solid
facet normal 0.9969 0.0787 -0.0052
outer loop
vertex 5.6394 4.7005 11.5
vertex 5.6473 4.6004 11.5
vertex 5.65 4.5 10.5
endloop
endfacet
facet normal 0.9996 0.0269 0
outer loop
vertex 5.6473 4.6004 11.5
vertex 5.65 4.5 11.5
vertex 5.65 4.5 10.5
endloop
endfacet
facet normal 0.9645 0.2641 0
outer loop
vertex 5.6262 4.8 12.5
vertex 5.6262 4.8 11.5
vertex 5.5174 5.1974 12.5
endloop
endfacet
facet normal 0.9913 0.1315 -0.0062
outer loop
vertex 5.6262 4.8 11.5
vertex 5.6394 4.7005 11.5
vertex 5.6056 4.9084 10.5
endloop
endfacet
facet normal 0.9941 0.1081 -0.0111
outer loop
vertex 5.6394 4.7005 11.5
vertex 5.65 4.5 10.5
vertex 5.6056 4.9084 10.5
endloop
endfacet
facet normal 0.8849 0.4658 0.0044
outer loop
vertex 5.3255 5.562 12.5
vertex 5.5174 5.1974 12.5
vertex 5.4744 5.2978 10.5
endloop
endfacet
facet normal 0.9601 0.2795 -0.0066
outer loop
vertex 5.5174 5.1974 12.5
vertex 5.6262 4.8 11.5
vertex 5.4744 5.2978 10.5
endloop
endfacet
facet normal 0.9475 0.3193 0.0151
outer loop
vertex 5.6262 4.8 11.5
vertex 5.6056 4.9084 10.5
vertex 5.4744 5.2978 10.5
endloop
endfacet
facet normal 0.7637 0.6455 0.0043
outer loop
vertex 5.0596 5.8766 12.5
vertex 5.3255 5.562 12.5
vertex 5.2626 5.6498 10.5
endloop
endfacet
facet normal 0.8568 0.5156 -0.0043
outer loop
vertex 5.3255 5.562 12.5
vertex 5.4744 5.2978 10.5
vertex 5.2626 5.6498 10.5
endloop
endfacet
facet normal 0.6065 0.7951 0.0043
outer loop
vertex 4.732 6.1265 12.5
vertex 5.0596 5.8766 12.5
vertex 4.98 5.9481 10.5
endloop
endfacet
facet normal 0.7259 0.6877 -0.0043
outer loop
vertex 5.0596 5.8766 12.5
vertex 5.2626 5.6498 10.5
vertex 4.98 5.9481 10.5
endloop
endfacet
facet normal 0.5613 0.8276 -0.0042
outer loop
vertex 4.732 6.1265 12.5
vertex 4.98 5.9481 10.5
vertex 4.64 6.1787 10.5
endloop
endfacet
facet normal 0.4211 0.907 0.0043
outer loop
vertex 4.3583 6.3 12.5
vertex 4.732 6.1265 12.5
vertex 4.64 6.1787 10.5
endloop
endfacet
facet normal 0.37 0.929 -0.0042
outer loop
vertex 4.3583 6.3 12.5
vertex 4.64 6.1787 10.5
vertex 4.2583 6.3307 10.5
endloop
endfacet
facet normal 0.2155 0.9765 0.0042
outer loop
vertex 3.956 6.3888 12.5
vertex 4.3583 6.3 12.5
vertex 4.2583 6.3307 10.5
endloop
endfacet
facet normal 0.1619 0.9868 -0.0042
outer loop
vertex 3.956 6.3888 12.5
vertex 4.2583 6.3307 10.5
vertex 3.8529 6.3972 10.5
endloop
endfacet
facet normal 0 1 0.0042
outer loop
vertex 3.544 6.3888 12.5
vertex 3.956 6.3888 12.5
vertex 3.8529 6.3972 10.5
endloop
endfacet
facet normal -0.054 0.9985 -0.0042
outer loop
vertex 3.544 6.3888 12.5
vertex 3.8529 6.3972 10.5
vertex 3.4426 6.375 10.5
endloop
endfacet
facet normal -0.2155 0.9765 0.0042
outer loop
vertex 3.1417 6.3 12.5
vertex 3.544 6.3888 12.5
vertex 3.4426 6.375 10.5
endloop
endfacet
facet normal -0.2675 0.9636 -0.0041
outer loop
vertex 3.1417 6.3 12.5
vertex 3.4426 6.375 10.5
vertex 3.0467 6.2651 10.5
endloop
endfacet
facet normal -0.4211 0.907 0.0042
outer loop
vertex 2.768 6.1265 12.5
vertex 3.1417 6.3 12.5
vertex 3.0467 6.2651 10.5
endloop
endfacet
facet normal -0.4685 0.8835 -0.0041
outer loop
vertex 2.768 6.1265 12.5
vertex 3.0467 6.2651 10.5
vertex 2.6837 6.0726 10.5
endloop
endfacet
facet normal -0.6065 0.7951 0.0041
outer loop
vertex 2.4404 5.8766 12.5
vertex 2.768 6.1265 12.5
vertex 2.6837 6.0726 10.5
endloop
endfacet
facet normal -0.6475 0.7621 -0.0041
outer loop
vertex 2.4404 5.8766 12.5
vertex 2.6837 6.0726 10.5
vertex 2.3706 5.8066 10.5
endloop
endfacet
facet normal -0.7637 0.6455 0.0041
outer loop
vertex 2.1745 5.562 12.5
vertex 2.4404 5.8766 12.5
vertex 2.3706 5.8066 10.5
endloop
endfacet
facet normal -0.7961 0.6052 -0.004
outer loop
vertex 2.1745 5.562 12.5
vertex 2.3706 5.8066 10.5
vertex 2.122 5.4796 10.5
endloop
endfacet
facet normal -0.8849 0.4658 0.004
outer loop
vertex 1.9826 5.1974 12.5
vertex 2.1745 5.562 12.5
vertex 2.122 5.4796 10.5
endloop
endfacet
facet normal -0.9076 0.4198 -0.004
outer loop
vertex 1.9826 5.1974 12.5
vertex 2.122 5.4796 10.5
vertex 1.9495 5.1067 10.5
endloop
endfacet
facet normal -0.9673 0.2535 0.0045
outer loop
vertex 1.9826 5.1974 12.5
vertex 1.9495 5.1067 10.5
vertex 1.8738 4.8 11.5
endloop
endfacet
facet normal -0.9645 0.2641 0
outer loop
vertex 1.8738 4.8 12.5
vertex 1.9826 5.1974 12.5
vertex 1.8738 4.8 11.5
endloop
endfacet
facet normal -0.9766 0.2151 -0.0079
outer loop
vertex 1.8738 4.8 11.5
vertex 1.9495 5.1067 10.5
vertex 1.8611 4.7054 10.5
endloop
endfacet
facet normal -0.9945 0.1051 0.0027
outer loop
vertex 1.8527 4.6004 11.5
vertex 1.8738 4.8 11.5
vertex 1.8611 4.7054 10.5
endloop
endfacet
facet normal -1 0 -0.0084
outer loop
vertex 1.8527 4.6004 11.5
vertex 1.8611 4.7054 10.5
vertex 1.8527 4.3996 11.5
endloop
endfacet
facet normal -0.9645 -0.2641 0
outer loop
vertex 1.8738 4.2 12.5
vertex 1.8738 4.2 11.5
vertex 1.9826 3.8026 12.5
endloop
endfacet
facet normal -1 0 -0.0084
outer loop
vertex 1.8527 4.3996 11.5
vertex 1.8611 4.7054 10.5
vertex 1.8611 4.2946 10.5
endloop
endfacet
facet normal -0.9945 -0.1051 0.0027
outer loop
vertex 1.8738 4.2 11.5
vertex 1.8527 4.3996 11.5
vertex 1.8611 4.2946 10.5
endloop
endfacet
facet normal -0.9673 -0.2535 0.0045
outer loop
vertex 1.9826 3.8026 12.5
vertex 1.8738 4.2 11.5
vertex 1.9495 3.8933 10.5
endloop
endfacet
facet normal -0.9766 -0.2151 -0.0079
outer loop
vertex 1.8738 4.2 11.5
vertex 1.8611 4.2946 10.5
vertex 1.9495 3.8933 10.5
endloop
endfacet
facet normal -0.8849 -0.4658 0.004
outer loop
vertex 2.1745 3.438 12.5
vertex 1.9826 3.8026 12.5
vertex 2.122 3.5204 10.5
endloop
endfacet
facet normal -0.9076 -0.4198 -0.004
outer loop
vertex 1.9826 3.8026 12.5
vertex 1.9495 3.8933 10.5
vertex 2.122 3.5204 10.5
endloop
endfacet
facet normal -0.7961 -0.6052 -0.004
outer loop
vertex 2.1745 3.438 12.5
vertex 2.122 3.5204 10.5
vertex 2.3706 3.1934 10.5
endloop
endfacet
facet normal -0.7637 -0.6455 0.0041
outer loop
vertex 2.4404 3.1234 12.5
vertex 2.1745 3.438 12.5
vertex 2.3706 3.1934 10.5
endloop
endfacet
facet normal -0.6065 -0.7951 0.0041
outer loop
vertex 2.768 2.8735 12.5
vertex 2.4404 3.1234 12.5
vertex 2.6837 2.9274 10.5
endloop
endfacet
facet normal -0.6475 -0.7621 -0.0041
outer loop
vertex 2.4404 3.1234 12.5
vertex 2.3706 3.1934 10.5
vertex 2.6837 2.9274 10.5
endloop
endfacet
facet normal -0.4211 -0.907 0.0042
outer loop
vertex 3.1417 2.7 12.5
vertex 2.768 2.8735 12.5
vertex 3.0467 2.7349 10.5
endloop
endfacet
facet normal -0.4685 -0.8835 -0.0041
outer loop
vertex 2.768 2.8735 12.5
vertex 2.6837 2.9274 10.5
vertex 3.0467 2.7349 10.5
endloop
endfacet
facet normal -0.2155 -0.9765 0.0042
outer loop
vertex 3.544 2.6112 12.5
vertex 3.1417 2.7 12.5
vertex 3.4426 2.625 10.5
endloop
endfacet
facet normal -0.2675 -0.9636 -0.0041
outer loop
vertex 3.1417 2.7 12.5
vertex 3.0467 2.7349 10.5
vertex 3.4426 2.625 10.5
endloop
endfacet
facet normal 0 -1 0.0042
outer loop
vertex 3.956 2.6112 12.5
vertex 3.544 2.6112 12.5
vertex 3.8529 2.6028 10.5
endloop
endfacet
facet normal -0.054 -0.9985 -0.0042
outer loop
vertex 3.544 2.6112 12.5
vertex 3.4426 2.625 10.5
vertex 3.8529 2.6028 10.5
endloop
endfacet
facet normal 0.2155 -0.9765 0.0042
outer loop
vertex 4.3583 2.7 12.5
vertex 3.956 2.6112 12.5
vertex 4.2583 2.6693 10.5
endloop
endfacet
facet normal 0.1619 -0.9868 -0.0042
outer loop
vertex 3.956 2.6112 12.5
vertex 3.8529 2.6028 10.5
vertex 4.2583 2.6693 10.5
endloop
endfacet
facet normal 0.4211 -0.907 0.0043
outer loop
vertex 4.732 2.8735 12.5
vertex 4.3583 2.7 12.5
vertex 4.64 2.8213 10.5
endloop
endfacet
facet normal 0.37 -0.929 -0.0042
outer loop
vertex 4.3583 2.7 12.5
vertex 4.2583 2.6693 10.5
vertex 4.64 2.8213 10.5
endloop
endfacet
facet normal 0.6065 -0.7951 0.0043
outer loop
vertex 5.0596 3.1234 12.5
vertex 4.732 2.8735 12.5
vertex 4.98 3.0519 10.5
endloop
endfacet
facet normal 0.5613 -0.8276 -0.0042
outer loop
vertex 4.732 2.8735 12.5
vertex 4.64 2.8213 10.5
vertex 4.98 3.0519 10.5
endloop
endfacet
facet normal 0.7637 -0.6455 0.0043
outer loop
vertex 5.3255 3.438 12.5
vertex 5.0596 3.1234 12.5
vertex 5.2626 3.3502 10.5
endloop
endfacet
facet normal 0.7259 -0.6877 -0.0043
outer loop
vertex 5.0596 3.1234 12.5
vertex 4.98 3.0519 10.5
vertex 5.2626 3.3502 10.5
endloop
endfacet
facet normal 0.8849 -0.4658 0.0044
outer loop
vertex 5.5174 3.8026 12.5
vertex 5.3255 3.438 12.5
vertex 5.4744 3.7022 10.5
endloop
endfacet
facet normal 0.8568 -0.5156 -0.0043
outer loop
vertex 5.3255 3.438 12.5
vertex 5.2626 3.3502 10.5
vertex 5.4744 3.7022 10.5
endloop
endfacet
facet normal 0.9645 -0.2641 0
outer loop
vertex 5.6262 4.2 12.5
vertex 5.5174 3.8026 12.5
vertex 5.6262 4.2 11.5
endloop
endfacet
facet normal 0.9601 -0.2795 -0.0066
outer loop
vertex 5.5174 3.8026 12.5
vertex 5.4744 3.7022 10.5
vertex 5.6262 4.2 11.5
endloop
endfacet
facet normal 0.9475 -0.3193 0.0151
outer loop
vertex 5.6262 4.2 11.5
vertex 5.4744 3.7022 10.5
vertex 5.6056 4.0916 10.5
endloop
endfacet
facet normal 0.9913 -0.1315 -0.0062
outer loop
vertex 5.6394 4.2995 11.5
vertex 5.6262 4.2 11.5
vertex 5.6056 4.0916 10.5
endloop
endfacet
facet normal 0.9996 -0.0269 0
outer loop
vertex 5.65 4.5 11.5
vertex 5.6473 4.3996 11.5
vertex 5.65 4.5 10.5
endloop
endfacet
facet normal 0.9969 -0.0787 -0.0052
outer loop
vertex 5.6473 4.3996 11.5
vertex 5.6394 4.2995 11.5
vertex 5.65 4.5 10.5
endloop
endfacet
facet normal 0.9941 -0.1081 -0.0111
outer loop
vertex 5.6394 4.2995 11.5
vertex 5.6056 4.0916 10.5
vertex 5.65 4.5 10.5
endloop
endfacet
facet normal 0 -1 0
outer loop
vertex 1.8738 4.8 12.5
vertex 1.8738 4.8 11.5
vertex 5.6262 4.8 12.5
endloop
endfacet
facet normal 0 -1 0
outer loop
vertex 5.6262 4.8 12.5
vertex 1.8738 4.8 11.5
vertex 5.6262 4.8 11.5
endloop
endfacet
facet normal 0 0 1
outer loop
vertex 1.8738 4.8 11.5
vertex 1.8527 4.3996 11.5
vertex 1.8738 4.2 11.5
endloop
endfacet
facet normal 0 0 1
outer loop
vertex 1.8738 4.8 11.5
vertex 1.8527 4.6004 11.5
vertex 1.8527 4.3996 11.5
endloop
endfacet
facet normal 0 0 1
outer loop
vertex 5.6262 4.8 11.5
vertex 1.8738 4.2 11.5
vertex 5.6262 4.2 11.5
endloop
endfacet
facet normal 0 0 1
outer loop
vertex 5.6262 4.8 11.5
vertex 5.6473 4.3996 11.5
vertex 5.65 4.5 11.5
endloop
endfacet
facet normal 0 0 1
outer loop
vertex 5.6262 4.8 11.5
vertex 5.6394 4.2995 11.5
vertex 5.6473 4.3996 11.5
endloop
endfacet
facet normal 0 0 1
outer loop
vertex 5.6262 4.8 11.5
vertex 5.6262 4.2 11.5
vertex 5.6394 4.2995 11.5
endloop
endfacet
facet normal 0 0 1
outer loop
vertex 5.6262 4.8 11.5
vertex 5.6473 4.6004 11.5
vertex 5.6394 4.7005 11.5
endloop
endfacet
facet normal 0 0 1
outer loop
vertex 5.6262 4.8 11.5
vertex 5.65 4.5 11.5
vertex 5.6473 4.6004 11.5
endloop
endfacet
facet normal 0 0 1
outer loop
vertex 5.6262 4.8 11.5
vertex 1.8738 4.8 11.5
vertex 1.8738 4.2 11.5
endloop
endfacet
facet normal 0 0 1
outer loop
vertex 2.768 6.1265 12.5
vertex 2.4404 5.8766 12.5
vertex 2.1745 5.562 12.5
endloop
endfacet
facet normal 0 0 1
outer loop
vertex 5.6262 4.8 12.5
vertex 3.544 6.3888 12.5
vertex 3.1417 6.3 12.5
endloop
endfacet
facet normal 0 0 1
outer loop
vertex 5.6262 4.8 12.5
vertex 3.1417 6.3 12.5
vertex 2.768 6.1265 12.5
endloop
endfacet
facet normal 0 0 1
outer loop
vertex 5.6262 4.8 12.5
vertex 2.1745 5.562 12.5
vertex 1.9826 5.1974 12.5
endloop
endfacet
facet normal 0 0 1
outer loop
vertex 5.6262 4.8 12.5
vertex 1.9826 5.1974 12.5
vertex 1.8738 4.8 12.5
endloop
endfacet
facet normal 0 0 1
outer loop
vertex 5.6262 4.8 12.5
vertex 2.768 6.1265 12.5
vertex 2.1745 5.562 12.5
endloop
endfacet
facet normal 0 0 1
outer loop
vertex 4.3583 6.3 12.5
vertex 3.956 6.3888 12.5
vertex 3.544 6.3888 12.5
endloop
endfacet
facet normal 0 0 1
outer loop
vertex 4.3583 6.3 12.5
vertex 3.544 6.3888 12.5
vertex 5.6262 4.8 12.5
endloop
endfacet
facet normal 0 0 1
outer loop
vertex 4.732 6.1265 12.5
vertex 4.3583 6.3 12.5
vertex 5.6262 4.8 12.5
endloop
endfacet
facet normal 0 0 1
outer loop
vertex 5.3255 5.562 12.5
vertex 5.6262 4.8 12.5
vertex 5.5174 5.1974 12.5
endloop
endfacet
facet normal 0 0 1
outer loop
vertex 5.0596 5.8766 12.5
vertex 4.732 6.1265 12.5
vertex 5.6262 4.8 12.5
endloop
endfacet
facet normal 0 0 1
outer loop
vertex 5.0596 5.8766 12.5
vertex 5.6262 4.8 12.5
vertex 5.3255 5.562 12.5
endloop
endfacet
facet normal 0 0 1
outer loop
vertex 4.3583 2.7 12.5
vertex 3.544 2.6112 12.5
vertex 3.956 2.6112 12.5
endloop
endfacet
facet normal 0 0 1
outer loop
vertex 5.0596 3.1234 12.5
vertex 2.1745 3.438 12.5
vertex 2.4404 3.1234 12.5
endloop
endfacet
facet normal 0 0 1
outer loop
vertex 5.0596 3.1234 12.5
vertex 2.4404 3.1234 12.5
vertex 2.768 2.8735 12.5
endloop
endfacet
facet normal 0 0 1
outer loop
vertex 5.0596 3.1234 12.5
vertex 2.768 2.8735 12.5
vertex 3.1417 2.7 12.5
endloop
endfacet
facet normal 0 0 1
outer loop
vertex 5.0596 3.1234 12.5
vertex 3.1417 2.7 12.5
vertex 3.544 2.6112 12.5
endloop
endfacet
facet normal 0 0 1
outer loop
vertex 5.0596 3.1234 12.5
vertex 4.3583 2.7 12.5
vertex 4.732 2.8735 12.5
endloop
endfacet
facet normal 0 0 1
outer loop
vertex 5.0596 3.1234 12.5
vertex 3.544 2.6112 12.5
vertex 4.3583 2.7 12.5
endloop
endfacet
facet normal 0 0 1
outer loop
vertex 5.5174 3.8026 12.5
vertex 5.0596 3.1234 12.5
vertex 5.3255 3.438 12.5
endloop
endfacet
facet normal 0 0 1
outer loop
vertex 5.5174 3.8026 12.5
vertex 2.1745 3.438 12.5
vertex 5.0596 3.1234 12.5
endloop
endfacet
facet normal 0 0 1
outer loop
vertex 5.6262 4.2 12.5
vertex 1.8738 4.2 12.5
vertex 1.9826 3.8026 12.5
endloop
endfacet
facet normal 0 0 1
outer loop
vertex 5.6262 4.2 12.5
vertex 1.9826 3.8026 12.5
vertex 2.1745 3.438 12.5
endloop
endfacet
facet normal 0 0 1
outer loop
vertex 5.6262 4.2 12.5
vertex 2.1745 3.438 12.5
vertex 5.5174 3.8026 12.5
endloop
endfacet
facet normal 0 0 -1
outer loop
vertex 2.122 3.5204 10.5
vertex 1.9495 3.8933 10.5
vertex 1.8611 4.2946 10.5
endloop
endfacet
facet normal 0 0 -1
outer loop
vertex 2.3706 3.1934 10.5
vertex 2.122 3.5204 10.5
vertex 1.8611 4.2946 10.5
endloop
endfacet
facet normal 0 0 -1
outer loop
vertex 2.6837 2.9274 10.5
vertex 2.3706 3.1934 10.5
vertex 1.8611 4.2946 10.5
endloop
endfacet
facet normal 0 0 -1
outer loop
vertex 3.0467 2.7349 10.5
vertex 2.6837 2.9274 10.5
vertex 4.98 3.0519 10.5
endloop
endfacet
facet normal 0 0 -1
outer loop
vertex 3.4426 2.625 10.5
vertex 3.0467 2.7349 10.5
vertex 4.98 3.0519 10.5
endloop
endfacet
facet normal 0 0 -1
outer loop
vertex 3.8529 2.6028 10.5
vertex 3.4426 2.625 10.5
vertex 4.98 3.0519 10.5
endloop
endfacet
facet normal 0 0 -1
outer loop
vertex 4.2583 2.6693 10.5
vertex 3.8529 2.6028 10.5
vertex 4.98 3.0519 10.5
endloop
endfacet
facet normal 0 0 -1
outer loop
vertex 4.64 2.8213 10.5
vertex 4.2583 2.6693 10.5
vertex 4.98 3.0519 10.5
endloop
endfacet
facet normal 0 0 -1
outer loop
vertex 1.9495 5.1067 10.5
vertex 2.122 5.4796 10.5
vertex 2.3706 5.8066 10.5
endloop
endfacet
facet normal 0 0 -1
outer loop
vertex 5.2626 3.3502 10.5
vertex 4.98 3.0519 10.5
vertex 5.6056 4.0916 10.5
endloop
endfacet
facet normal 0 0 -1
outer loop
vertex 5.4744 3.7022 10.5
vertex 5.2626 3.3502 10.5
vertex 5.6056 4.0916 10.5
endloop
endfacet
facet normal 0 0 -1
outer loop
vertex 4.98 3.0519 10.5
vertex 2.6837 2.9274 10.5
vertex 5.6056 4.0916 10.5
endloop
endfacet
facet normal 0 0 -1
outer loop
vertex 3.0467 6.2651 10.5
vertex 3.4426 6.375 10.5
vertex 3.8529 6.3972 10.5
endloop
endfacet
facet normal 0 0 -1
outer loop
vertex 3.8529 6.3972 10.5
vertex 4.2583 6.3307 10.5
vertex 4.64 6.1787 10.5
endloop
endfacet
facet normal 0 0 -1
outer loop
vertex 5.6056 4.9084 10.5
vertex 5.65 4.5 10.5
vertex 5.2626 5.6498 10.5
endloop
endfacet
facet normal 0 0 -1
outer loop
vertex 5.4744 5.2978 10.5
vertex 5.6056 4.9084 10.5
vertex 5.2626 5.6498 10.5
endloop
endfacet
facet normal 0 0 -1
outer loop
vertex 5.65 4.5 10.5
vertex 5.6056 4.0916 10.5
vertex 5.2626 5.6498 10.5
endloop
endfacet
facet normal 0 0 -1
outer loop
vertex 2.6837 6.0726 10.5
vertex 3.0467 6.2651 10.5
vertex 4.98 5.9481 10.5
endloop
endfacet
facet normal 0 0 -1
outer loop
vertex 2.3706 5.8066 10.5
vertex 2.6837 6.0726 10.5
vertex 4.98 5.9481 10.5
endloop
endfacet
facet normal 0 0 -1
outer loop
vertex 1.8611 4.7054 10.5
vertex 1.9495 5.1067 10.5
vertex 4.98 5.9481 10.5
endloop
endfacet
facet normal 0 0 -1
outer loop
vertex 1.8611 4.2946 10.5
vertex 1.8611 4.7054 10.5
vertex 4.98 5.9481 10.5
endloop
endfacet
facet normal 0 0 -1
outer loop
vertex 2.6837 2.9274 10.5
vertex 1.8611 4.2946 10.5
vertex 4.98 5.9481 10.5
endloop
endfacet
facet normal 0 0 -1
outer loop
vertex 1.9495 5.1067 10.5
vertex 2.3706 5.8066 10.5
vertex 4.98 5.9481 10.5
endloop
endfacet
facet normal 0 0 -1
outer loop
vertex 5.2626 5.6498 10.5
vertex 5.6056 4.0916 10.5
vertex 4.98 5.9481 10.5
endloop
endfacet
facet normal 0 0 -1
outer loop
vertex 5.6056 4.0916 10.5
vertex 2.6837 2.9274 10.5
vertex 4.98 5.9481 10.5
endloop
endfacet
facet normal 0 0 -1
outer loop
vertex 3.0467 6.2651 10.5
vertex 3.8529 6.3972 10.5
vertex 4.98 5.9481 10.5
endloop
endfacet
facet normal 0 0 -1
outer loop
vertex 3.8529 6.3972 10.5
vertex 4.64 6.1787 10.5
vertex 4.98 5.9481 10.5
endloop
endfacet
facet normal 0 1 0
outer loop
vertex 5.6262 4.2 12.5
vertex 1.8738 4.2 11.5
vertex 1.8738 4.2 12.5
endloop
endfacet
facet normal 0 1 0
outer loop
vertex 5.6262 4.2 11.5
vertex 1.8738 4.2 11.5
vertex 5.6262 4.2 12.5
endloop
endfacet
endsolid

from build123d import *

# Parameters (mm, degrees)
BOX005_W          = 4
BOX005_H          = 0.6
BOX005_DEPTH      = 1
CYLINDER003_R     = 1.9
CYLINDER003_DEPTH = 2


with BuildPart() as cube003:
    # Box005 → Box005 (new body)
    with BuildSketch(Plane(origin=(-2, -0.3, 1), x_dir=(1, 0, 0), z_dir=(0, 0, 1))):
        with Locations((2, 0.3)):
            Rectangle(BOX005_W, BOX005_H)
    extrude(amount=BOX005_DEPTH)


with BuildPart() as cut005:
    # Cylinder003 → Cylinder003 (new body)
    with BuildSketch(Plane.XY):
        Circle(CYLINDER003_R)
    extrude(amount=CYLINDER003_DEPTH)

    # Cut005: cut Cube003
    add(cube003.part, mode=Mode.SUBTRACT)


with BuildPart() as cut005_1:
    # Cut005 placement: moved
    add(cut005.part.moved(Location((3.75, 4.5, 10.5))))


solid = cut005_1.part
